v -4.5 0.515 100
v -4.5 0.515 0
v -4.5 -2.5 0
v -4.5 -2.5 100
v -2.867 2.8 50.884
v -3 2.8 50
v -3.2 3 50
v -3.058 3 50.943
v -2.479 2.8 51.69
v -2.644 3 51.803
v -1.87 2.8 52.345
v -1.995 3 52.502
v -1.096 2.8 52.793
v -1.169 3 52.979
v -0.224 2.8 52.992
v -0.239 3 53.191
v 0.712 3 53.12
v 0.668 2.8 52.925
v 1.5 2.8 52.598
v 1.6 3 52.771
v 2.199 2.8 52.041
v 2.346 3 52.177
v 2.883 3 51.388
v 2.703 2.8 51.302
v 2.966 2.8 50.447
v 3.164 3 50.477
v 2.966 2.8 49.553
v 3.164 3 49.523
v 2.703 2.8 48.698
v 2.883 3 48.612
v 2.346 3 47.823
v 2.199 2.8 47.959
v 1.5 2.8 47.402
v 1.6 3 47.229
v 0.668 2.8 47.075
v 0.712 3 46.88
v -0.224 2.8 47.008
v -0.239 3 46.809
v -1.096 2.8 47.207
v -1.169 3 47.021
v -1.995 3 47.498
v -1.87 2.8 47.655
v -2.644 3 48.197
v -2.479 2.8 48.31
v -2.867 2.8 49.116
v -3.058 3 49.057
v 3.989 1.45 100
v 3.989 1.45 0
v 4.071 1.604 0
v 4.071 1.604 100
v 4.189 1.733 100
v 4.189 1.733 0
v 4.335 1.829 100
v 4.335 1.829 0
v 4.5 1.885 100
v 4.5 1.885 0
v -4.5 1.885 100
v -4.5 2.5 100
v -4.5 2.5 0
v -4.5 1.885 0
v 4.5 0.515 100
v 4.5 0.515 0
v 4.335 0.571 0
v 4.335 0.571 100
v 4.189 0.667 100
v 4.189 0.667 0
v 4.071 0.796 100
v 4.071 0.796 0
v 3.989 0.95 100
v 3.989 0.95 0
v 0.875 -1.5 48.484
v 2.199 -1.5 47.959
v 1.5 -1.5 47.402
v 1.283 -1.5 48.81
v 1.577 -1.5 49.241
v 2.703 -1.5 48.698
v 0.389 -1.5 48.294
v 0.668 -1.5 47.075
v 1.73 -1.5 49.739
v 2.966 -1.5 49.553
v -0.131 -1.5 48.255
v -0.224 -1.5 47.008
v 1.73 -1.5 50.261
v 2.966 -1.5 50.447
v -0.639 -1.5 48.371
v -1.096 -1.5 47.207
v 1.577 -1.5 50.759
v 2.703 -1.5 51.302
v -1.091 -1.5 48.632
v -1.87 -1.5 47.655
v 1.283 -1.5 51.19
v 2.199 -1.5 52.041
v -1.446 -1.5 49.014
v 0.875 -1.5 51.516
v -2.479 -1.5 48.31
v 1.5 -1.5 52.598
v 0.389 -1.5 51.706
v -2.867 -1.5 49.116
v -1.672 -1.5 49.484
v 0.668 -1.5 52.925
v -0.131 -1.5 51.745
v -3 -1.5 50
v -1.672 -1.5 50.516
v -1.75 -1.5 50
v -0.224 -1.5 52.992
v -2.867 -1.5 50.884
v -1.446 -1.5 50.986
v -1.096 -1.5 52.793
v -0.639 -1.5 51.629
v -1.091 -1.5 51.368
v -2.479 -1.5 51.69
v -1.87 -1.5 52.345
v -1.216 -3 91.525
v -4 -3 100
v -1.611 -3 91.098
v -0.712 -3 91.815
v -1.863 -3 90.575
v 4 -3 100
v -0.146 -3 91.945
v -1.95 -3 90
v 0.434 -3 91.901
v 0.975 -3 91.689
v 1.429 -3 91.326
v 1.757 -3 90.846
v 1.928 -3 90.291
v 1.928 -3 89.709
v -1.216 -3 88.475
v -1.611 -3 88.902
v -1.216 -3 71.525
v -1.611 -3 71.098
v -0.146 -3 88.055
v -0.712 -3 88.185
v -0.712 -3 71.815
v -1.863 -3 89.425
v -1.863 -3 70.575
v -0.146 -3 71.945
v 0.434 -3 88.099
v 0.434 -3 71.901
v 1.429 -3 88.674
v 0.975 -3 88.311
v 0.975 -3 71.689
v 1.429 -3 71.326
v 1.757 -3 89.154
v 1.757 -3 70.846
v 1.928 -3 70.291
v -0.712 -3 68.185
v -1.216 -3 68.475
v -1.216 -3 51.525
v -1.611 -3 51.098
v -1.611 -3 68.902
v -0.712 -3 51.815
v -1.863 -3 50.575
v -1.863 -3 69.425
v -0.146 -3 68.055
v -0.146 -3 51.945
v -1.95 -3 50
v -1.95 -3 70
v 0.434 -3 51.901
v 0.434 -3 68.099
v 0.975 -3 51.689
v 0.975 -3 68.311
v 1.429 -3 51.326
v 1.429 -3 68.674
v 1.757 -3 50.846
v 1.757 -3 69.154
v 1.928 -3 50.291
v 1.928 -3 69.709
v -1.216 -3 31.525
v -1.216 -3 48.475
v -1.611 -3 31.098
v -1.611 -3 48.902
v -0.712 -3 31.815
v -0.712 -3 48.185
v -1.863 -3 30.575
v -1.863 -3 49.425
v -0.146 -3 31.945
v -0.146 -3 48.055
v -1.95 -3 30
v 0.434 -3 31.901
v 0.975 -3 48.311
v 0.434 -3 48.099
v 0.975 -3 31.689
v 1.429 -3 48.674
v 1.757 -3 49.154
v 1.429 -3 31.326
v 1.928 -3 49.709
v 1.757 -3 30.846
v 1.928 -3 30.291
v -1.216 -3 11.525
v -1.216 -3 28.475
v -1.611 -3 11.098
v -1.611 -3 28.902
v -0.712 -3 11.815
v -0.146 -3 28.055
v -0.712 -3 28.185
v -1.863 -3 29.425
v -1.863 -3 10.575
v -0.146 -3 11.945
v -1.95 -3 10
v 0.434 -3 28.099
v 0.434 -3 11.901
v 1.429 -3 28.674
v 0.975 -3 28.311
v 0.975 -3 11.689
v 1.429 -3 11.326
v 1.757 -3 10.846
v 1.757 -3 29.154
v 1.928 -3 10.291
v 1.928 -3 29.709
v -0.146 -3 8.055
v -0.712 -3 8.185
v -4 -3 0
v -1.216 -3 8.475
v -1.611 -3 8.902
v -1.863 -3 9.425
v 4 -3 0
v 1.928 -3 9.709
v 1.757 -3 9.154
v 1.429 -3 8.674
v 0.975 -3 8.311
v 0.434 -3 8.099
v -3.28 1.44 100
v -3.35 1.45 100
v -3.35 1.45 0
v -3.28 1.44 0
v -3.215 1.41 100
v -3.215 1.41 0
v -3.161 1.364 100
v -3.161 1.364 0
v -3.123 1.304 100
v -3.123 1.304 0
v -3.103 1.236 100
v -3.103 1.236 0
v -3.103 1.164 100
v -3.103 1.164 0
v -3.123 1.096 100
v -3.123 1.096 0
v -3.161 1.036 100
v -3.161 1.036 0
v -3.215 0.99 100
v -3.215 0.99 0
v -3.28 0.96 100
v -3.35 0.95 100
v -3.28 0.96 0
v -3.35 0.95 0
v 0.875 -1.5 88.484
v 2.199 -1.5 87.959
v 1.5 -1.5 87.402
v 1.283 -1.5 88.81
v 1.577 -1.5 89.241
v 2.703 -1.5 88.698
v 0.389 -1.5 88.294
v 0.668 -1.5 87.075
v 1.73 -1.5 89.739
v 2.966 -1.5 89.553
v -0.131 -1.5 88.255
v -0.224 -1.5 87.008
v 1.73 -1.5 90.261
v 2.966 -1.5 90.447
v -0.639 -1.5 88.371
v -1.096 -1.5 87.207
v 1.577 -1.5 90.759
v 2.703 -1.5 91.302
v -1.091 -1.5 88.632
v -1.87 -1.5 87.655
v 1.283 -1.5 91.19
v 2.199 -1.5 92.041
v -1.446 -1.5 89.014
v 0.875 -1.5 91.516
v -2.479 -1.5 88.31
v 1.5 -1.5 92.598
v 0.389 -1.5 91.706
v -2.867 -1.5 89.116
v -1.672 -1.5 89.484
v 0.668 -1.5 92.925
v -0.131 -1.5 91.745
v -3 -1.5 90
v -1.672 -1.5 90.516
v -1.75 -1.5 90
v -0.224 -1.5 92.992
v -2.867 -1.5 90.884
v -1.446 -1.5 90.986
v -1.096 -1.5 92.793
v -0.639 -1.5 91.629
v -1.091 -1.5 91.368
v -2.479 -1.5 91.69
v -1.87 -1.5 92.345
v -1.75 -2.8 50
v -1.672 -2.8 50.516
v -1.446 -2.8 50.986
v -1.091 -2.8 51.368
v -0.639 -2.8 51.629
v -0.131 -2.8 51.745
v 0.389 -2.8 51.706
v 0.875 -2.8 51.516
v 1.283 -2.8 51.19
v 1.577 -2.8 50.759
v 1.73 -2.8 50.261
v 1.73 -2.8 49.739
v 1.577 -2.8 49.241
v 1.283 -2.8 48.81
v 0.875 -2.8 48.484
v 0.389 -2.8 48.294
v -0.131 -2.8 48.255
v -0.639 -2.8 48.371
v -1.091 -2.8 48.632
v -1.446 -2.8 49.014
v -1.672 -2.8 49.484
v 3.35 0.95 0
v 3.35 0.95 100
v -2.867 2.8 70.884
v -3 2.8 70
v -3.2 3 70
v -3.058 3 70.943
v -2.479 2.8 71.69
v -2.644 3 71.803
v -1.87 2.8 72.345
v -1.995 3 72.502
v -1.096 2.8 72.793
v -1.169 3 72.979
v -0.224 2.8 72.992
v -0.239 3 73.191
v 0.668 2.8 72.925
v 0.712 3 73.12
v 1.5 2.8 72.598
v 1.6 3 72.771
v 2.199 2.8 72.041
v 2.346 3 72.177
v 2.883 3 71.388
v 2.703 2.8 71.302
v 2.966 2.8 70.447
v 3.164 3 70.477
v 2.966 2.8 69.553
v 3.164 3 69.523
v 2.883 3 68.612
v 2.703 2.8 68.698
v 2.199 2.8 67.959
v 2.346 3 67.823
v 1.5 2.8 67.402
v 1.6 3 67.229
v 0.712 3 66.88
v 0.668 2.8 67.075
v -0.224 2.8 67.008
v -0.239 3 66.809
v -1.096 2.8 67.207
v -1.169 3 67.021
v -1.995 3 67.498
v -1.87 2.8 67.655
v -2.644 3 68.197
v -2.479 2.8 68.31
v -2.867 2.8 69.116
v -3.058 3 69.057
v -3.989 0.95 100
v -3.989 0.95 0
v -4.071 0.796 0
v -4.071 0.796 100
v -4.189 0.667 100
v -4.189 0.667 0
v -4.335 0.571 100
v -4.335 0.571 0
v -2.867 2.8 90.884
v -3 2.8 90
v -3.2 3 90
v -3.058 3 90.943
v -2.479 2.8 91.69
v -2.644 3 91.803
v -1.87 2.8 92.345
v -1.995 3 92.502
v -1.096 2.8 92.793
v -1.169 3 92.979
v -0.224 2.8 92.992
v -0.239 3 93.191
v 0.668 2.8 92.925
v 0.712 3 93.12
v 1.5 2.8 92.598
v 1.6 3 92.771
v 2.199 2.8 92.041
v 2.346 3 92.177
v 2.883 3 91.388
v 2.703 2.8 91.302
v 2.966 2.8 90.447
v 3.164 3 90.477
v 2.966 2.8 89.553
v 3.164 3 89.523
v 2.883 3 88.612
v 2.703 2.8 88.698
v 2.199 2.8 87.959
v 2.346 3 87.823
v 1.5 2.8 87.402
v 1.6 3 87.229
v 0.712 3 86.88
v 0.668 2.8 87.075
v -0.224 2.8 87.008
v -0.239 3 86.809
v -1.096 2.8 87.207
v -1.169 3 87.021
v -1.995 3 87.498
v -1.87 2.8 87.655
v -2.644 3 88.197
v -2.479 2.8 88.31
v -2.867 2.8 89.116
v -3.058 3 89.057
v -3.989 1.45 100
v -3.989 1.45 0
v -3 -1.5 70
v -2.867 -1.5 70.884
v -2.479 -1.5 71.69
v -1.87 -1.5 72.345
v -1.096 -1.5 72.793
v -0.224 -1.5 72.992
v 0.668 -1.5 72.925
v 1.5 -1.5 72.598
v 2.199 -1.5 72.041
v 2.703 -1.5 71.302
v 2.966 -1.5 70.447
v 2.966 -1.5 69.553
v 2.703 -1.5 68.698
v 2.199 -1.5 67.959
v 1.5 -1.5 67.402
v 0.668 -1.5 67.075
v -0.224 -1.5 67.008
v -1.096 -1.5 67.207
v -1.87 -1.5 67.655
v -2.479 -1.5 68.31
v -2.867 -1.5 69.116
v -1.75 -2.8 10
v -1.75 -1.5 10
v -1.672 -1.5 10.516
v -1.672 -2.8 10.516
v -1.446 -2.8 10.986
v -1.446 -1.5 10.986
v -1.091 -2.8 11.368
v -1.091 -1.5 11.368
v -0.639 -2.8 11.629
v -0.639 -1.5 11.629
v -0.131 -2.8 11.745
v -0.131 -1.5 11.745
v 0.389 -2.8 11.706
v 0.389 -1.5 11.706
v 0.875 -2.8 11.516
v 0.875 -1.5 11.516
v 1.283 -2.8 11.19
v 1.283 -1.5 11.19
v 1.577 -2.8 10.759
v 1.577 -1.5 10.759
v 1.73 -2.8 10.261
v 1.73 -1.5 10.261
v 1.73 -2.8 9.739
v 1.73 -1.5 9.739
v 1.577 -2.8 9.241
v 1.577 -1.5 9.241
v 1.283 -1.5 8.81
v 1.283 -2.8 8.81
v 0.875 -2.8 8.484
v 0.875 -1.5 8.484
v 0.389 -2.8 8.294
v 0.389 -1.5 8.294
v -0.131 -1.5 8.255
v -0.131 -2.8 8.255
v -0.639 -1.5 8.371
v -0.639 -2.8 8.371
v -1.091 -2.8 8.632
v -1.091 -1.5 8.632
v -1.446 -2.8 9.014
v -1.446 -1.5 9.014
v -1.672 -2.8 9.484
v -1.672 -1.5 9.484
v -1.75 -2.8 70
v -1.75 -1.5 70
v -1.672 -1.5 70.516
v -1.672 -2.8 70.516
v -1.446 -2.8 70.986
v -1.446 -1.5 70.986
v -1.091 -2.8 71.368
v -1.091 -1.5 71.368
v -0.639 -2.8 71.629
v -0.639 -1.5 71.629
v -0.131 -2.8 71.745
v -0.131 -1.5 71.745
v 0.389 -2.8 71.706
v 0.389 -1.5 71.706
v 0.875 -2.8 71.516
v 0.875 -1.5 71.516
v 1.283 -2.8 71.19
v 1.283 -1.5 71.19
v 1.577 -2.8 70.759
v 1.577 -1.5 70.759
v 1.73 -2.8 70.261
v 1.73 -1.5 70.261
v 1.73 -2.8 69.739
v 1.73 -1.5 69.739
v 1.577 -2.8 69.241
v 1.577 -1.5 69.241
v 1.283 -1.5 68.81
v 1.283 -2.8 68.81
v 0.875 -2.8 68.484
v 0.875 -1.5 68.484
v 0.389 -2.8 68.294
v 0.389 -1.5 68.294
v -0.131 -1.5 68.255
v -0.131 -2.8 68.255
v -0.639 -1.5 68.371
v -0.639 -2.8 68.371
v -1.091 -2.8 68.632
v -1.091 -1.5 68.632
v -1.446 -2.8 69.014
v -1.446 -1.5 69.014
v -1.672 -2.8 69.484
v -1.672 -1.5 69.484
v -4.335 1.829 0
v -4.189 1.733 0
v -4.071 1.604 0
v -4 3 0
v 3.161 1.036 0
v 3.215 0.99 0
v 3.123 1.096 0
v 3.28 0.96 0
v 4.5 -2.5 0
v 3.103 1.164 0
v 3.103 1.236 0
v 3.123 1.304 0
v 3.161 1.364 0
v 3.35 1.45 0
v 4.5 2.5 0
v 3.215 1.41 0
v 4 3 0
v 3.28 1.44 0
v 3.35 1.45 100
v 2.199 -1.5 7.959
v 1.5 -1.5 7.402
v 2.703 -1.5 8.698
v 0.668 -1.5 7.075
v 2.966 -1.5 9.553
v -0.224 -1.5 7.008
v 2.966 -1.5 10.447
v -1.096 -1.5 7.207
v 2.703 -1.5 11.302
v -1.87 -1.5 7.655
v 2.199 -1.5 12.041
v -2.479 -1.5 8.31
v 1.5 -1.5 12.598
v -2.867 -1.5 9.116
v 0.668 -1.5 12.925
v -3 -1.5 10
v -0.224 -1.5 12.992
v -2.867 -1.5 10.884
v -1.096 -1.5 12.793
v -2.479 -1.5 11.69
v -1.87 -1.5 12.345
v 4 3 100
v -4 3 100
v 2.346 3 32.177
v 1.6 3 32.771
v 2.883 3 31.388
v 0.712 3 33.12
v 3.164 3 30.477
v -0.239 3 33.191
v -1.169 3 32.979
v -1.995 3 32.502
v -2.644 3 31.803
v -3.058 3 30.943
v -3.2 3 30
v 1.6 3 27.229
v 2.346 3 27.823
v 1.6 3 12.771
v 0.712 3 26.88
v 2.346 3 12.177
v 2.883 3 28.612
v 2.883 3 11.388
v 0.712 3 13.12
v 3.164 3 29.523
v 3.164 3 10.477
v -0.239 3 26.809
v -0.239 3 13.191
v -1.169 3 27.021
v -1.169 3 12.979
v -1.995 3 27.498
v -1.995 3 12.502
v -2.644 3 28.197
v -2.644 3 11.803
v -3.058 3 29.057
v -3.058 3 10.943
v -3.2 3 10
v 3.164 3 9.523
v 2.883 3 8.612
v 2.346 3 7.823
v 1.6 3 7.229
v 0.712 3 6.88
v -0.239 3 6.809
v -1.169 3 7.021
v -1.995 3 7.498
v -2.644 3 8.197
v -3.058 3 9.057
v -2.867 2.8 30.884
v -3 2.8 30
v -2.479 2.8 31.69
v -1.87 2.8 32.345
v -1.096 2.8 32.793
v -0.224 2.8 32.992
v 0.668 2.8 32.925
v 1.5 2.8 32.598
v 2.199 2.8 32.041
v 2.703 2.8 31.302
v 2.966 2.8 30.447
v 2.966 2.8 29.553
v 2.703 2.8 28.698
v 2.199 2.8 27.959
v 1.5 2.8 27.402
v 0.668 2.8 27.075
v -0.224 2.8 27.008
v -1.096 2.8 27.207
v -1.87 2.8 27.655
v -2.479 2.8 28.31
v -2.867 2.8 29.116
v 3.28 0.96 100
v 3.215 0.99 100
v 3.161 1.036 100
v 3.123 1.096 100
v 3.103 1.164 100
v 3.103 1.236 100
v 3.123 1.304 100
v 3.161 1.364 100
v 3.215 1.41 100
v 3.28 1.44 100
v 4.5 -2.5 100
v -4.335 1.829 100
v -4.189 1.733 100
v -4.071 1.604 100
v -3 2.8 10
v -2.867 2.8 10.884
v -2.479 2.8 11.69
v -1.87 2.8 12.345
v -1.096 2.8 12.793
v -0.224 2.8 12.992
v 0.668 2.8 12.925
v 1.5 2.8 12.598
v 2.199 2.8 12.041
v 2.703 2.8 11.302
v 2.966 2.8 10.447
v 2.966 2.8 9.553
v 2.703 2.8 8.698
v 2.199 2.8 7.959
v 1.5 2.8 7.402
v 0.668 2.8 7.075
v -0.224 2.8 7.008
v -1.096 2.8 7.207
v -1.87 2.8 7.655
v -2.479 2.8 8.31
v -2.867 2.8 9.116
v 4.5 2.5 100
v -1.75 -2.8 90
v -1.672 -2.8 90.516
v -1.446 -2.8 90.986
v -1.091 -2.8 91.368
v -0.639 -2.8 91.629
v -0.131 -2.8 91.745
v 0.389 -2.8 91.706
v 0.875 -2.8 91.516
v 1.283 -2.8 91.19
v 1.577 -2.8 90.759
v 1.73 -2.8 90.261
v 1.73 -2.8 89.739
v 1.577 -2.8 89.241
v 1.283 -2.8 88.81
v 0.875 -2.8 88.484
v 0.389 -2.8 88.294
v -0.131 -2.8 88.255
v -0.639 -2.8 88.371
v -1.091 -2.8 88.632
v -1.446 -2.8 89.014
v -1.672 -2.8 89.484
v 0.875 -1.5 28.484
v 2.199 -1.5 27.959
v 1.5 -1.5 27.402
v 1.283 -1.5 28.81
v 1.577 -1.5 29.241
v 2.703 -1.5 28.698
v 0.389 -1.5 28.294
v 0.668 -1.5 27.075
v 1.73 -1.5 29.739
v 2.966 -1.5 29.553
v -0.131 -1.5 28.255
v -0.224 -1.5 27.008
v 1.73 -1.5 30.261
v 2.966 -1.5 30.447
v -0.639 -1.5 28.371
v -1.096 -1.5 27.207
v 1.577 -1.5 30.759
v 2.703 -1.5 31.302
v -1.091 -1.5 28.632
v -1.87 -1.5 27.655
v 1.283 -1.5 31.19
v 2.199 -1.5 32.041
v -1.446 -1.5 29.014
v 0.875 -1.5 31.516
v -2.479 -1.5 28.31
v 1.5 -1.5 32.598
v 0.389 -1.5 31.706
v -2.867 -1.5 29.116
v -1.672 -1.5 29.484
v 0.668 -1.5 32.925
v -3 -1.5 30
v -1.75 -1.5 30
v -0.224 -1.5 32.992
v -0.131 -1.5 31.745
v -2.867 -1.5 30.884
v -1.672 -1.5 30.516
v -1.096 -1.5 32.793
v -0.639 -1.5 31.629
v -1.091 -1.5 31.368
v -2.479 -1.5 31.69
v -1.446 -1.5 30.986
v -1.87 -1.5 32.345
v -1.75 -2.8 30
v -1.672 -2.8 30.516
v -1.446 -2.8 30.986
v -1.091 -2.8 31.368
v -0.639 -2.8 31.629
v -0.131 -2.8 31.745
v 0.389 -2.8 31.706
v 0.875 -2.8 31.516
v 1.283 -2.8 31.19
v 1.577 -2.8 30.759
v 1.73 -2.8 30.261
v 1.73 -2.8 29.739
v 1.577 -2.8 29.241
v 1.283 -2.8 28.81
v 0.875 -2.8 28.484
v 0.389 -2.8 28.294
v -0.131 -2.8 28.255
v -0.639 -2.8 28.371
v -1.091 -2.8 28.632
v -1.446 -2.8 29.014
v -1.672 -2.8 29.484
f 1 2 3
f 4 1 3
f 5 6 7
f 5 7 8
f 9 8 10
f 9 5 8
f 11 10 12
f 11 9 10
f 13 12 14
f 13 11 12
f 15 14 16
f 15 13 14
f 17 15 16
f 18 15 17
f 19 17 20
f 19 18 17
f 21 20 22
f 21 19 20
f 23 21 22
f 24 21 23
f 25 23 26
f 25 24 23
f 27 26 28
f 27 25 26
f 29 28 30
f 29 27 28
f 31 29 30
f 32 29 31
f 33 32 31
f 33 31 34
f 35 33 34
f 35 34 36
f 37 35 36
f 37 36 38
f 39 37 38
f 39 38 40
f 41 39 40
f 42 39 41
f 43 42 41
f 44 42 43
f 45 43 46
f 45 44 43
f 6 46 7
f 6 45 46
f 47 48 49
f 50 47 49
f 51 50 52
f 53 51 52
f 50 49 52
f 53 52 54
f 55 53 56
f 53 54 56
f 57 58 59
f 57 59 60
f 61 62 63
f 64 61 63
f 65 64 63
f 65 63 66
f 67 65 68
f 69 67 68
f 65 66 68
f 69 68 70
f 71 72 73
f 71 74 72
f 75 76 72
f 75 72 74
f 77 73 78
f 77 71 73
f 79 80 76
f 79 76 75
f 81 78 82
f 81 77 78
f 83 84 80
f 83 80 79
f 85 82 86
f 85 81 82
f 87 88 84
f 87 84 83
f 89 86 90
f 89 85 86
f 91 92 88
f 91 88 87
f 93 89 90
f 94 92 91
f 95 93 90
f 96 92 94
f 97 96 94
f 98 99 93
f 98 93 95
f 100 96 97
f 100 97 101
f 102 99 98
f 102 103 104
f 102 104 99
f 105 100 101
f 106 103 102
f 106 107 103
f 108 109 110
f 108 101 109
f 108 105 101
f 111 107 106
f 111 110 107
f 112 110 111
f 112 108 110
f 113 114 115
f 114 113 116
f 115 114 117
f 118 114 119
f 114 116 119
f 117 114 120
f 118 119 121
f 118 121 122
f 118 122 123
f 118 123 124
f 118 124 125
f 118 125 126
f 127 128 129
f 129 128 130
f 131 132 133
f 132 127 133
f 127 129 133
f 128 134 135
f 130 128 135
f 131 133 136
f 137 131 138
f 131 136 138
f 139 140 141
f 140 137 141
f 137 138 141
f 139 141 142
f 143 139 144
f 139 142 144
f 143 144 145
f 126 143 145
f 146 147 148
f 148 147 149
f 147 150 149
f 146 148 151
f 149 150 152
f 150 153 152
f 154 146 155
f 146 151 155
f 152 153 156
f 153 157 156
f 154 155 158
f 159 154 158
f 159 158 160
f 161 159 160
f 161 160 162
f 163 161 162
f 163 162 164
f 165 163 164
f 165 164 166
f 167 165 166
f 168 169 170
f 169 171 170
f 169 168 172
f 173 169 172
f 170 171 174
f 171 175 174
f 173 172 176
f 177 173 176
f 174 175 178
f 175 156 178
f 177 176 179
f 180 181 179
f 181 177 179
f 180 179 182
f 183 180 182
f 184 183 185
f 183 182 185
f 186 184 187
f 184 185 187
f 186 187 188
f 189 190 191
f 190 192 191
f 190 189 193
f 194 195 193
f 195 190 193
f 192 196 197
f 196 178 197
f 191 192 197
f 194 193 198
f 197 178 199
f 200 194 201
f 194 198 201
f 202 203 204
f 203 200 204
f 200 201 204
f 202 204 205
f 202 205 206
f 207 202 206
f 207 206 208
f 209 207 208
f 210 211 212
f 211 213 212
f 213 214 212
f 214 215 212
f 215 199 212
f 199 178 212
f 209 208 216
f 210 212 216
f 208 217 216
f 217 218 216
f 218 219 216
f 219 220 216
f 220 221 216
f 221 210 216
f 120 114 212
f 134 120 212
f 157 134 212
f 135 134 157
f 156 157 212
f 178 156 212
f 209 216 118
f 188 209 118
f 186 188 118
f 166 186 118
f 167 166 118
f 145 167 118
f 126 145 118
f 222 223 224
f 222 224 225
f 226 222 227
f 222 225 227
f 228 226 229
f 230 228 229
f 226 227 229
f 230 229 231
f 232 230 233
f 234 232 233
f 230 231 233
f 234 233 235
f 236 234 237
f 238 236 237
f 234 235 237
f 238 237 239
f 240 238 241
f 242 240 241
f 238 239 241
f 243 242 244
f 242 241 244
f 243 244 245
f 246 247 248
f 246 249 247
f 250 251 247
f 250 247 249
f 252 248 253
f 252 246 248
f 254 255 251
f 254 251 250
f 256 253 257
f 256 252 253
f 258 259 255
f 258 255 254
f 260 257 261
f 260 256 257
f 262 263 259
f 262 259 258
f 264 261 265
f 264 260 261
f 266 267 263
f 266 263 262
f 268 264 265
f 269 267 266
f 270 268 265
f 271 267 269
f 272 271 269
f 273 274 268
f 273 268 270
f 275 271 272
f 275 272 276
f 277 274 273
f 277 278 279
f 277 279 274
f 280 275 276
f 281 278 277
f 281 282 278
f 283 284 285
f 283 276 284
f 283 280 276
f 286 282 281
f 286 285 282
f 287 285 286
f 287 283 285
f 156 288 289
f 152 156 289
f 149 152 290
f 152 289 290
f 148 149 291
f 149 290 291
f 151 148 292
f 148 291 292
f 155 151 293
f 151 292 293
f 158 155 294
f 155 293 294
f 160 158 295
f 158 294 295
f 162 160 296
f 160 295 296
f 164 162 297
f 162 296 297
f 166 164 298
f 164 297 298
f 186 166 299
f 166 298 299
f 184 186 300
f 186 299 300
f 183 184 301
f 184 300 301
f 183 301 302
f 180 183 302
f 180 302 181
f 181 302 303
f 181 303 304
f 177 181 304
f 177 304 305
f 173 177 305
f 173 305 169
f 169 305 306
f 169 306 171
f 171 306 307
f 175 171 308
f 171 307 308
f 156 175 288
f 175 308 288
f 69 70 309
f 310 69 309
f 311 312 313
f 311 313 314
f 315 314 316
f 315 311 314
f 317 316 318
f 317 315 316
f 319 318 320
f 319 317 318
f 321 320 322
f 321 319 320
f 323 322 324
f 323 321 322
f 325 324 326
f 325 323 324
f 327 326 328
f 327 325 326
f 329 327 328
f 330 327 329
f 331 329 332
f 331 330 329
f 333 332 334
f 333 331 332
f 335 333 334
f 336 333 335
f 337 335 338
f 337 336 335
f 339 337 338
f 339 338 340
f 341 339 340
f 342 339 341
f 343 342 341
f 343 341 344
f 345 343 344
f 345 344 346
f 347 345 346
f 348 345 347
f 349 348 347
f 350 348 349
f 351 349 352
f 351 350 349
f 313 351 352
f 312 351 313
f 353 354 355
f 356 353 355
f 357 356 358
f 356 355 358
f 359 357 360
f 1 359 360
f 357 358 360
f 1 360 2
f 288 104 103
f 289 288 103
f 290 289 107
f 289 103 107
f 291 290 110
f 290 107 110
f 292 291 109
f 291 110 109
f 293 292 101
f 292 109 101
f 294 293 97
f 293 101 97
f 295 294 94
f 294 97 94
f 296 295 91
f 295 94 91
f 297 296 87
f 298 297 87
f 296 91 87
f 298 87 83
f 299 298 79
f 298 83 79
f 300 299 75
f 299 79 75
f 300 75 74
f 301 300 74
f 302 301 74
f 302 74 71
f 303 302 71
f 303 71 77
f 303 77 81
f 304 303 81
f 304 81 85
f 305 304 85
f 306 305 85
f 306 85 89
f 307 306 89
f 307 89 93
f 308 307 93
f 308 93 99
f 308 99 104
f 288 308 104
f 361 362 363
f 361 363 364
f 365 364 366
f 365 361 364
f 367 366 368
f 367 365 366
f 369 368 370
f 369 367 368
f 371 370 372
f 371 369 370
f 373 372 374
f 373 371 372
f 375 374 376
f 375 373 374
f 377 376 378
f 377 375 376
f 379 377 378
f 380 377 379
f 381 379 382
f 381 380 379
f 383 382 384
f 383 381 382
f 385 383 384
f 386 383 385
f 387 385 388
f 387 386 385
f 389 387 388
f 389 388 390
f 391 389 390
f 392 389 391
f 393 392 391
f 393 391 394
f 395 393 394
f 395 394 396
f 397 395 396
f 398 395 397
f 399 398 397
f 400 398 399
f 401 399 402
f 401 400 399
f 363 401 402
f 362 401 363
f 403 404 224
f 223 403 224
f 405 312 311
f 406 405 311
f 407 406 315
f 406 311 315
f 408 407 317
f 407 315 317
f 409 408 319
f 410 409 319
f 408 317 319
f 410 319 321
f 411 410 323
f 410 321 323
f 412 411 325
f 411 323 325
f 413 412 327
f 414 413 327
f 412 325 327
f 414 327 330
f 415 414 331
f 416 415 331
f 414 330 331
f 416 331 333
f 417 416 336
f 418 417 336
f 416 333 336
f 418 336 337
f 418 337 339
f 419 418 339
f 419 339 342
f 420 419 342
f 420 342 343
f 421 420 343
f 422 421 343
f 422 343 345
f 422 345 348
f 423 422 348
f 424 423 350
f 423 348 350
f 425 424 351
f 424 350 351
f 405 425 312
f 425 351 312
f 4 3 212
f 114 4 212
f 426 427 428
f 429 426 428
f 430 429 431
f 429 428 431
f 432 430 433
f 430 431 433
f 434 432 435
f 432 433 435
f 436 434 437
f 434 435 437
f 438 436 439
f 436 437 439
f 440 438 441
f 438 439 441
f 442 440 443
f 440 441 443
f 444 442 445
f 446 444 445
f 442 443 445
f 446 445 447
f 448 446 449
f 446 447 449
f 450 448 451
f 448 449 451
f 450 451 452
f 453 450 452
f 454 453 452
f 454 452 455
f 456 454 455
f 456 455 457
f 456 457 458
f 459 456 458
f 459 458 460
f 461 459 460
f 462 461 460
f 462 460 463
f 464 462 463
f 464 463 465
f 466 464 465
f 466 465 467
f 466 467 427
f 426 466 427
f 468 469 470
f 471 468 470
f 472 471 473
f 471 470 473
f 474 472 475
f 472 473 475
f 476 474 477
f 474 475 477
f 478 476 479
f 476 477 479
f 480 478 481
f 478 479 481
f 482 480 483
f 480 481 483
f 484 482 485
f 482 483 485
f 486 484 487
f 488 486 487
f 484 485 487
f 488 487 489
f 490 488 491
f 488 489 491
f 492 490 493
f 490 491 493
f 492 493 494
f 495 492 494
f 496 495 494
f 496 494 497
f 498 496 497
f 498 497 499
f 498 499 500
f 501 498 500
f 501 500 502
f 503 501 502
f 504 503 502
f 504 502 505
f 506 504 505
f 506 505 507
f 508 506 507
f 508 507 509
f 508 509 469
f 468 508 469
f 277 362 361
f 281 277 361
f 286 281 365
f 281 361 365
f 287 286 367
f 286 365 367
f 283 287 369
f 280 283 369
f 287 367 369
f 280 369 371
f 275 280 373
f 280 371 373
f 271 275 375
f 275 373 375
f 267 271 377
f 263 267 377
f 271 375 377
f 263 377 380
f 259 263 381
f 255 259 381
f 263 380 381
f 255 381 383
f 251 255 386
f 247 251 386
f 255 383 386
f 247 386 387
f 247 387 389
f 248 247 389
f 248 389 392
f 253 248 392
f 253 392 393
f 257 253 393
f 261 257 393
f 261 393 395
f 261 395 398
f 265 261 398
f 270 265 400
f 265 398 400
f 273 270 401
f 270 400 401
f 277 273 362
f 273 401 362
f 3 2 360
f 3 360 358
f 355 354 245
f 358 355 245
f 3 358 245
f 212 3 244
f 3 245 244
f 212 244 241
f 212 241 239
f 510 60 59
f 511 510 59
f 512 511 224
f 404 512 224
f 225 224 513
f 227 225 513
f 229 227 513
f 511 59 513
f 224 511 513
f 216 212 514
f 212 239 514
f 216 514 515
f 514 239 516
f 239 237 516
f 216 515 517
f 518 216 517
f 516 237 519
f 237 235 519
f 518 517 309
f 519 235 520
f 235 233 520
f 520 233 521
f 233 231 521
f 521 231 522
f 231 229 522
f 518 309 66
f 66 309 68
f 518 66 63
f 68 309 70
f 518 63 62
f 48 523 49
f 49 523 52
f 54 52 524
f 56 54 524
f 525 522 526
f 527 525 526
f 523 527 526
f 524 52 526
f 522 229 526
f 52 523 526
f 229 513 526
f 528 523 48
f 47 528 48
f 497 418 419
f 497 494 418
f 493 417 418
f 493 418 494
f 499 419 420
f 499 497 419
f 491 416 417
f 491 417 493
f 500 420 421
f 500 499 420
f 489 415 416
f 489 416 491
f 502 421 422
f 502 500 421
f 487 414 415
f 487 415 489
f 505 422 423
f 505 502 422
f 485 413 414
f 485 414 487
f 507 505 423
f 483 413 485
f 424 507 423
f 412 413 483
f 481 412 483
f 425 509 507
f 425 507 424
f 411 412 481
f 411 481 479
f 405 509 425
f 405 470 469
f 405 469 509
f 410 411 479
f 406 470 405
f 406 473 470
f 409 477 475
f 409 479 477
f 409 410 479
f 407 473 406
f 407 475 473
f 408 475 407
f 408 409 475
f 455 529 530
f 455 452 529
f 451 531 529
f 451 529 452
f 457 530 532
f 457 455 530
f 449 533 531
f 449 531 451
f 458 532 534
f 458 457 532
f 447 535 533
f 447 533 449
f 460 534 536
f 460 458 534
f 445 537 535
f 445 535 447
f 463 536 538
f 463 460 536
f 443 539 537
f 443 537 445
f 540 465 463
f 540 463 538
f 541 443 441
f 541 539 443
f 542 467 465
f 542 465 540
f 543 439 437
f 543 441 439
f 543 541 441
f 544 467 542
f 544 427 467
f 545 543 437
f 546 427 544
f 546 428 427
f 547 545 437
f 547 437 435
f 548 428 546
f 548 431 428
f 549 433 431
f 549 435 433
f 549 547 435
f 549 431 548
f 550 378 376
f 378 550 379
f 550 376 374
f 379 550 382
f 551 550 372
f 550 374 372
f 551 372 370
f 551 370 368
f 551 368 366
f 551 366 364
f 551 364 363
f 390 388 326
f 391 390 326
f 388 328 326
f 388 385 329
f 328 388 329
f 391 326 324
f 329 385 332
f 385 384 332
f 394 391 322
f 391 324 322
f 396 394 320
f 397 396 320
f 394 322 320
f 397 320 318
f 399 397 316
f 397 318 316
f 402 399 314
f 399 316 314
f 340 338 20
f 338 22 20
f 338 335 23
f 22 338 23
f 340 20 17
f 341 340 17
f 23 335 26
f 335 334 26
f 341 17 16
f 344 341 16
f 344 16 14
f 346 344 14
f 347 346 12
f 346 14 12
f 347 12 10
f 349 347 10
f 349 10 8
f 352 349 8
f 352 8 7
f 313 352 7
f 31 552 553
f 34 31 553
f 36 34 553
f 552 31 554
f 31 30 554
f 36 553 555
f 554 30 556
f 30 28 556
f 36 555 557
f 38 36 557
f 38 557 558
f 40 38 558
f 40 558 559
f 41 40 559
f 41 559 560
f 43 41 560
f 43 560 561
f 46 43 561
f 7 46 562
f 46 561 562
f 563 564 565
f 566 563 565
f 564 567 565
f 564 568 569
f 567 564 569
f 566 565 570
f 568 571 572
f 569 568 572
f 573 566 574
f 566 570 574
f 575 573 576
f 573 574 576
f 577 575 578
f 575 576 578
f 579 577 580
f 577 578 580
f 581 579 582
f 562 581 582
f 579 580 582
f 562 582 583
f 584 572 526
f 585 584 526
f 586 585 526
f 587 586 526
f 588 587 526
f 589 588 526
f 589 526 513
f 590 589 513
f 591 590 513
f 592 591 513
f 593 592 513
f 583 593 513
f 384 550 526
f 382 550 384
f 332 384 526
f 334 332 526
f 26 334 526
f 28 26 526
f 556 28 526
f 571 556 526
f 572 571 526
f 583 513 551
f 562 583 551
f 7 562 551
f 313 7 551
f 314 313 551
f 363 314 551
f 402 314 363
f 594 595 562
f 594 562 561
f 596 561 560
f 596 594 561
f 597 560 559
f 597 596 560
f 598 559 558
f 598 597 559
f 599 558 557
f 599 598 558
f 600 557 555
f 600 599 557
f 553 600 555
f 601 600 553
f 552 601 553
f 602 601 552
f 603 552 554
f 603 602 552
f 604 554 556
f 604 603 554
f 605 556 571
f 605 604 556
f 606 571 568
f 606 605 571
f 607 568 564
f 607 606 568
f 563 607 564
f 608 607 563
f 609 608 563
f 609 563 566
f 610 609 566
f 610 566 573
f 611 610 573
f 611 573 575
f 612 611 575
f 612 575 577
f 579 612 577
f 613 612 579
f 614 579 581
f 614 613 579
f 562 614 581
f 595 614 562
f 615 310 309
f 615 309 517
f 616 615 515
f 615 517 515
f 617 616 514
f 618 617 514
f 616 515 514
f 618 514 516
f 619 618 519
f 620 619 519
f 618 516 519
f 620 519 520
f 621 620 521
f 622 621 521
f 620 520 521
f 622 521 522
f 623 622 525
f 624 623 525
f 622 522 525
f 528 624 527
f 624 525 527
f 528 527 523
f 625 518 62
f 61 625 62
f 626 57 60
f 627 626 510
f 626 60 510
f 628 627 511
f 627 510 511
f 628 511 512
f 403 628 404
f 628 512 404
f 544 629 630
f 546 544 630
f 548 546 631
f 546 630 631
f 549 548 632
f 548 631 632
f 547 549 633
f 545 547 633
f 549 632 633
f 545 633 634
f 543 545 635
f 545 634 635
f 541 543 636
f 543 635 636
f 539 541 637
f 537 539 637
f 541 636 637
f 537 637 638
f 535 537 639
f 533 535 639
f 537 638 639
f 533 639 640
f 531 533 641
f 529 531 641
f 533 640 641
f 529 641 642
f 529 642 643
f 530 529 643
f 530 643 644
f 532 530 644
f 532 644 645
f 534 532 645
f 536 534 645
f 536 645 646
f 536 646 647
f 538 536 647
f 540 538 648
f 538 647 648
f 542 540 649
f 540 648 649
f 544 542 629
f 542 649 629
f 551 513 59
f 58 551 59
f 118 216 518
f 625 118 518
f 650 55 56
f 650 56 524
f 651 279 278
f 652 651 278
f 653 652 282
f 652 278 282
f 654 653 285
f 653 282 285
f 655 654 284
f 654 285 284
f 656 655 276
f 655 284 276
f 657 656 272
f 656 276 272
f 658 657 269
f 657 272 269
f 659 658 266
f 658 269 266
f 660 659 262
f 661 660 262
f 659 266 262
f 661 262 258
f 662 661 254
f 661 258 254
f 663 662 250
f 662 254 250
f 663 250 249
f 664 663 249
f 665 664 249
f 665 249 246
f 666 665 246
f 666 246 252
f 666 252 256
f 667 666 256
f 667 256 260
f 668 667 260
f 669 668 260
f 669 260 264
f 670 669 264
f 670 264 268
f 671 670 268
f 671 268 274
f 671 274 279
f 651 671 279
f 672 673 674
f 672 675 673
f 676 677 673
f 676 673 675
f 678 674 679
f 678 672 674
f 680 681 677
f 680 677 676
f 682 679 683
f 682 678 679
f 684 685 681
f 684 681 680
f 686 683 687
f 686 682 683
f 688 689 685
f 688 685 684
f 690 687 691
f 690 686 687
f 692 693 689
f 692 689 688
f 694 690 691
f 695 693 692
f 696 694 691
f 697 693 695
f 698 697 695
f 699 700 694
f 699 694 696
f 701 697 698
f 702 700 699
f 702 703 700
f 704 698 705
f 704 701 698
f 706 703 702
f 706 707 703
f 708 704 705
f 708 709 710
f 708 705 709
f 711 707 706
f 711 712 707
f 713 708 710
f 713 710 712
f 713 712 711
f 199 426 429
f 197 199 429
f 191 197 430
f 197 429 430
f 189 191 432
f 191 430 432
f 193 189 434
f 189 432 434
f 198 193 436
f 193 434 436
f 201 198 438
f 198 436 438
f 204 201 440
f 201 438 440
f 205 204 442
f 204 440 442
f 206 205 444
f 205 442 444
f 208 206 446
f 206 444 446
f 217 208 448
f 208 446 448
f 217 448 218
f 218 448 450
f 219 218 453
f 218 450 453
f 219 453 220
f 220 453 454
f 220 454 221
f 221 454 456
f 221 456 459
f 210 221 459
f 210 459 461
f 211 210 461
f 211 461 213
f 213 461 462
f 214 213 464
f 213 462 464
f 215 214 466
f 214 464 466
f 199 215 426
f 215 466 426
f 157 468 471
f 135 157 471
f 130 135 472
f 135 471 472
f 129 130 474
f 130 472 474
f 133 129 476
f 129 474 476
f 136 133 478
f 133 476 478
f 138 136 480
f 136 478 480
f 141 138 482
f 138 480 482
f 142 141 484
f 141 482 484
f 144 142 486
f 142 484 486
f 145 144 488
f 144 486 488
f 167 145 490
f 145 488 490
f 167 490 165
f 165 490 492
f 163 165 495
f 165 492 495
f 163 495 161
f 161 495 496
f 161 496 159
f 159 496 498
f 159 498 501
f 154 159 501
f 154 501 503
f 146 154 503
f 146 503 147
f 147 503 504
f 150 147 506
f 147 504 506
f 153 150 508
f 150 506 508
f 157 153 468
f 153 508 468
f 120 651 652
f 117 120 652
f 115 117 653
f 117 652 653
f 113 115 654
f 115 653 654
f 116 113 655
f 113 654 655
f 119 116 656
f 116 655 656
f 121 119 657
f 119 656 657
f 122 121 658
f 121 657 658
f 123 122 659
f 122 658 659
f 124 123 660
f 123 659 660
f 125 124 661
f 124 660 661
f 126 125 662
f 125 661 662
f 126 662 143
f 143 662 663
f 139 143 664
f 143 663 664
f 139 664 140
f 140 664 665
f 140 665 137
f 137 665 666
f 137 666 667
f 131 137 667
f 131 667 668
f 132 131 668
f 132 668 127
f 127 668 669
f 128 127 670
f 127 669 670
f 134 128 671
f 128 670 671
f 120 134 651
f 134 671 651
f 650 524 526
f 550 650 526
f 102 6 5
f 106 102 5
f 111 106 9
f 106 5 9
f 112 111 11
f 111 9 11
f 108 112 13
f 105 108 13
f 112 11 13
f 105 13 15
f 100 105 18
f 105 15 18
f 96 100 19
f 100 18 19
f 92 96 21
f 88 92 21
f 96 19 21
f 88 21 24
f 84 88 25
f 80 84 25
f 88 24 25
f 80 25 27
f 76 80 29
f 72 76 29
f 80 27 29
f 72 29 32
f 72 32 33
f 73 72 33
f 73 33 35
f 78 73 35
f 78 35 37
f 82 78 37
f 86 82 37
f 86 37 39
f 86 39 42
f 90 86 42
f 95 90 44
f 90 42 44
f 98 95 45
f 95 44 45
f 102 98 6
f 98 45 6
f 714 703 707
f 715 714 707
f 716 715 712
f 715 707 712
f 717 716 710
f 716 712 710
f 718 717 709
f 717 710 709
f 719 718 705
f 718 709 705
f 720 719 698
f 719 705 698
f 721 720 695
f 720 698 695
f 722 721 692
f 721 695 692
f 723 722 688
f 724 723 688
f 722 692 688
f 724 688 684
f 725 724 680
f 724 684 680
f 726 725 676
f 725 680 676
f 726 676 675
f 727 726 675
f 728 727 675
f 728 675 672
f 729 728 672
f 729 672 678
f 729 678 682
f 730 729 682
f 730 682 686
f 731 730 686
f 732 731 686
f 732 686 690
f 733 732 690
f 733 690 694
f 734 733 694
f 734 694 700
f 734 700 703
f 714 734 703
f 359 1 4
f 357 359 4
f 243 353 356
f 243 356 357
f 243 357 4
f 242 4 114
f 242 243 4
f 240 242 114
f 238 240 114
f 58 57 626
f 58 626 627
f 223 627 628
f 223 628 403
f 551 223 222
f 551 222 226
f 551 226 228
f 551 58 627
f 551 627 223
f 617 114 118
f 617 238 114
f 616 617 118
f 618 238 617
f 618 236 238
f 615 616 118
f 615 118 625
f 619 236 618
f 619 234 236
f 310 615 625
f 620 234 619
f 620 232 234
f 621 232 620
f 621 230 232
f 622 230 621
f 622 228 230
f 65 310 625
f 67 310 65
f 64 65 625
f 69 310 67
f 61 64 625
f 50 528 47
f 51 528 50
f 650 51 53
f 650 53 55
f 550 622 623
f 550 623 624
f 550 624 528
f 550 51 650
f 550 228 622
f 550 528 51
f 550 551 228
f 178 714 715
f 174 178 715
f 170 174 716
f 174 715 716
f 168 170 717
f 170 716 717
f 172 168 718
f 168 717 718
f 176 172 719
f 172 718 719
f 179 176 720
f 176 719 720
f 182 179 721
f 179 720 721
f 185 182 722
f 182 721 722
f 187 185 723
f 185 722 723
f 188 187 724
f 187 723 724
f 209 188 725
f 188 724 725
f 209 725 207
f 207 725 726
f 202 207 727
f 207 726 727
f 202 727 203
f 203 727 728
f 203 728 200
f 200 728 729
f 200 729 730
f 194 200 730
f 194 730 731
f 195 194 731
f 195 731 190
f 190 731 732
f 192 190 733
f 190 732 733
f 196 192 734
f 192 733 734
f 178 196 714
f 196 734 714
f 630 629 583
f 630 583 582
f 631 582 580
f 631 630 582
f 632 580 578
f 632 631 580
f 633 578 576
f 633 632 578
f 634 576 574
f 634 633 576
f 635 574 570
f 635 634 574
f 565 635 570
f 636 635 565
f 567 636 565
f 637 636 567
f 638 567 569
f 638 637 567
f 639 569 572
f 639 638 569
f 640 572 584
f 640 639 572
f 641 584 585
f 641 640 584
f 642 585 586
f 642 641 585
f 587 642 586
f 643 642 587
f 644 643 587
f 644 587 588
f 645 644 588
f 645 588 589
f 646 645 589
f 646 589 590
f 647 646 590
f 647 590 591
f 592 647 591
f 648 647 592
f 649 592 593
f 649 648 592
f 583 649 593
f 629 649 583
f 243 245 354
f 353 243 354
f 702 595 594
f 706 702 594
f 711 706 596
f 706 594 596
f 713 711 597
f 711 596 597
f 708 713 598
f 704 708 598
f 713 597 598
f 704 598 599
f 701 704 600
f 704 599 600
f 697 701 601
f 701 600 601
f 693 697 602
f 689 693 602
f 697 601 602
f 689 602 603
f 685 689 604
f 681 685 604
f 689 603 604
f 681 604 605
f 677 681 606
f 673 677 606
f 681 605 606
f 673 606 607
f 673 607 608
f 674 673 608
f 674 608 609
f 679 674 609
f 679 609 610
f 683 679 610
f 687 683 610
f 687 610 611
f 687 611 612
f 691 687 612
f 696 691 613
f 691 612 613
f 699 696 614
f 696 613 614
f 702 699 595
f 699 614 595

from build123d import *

# Parameters (mm, degrees)
BOSS_EXTRUDE1_DEPTH        = 100
SKETCH2_R                  = 3
CUT_EXTRUDE1_DEPTH         = 4.5
SKETCH3_R                  = 1.75
CUT_EXTRUDE2_DEPTH         = 101.202295383
CHAMFER1_SIZE              = 0.2
LPATTERN1_COUNT            = 5
LPATTERN1_PITCH            = 20
CHAMFER1_OF_LPATTERN1_SIZE = 0.2


with BuildPart() as part:
    # Sketch1 → Boss-Extrude1 (new body)
    with BuildSketch(Plane.XY):
        with BuildLine():
            Line((4.5, -2.5), (4.5, 0.514709157))
            ThreePointArc((4.5, 0.514709157), (4.188868575, 0.667088042), (3.988911299, 0.95))
            Line((3.988911299, 0.95), (3.35, 0.95))
            ThreePointArc((3.35, 0.95), (3.1, 1.2), (3.35, 1.45))
            Line((3.35, 1.45), (3.988911299, 1.45))
            ThreePointArc((3.988911299, 1.45), (4.188868575, 1.732911958), (4.5, 1.885290843))
            Line((4.5, 1.885290843), (4.5, 2.5))
            Line((4.5, 2.5), (4, 3))
            Line((4, 3), (-4, 3))
            Line((-4, 3), (-4.5, 2.5))
            Line((-4.5, 2.5), (-4.5, 1.885290843))
            ThreePointArc((-4.5, 1.885290843), (-4.188868575, 1.732911958), (-3.988911299, 1.45))
            Line((-3.988911299, 1.45), (-3.35, 1.45))
            ThreePointArc((-3.35, 1.45), (-3.1, 1.2), (-3.35, 0.95))
            Line((-3.35, 0.95), (-3.988911299, 0.95))
            ThreePointArc((-3.988911299, 0.95), (-4.188868575, 0.667088042), (-4.5, 0.514709157))
            Line((-4.5, 0.514709157), (-4.5, -2.5))
            Line((-4.5, -2.5), (-4, -3))
            Line((-4, -3), (4, -3))
            Line((4, -3), (4.5, -2.5))
        make_face()
    extrude(amount=BOSS_EXTRUDE1_DEPTH)

    # Sketch2 → Cut-Extrude1 (cut)
    with BuildSketch(Plane(origin=(0, 3, 0), x_dir=(1, 0, 0), z_dir=(0, 1, 0))):
        with Locations(Location((0, -10, 0), (0, 0, 180))):
            Circle(SKETCH2_R)
    cut_extrude1 = extrude(amount=-CUT_EXTRUDE1_DEPTH, mode=Mode.SUBTRACT)

    # Sketch3 → Cut-Extrude2 (cut, through all)
    with BuildSketch(Plane(origin=(0, -1.5, 0), x_dir=(1, 0, 0), z_dir=(0, 1, 0))):
        with Locations(Location((0, -10, 0), (0, 0, 180))):
            Circle(SKETCH3_R)
    cut_extrude2 = extrude(amount=-CUT_EXTRUDE2_DEPTH, mode=Mode.SUBTRACT)

    # Chamfer1
    chamfer1_edges = [part.edges().sort_by_distance(p)[0] for p in [
        (3, 3, 10),
        (1.75, -3, 10),
    ]]
    chamfer(chamfer1_edges, length=CHAMFER1_SIZE)

    # LPattern1: Cut-Extrude1, Cut-Extrude2 ×5
    with Locations(*[(0, 0, i * LPATTERN1_PITCH) for i in range(1, LPATTERN1_COUNT)]):
        add(cut_extrude1, mode=Mode.SUBTRACT)
        add(cut_extrude2, mode=Mode.SUBTRACT)

    # Chamfer1 of LPattern1
    chamfer1_of_lpattern1_edges = [part.edges().sort_by_distance(p)[0] for p in [
        (3, 3, 30),
        (1.75, -3, 30),
        (3, 3, 50),
        (1.75, -3, 50),
        (3, 3, 70),
        (1.75, -3, 70),
        (3, 3, 90),
        (1.75, -3, 90),
    ]]
    chamfer(chamfer1_of_lpattern1_edges, length=CHAMFER1_OF_LPATTERN1_SIZE)


solid = part.part
